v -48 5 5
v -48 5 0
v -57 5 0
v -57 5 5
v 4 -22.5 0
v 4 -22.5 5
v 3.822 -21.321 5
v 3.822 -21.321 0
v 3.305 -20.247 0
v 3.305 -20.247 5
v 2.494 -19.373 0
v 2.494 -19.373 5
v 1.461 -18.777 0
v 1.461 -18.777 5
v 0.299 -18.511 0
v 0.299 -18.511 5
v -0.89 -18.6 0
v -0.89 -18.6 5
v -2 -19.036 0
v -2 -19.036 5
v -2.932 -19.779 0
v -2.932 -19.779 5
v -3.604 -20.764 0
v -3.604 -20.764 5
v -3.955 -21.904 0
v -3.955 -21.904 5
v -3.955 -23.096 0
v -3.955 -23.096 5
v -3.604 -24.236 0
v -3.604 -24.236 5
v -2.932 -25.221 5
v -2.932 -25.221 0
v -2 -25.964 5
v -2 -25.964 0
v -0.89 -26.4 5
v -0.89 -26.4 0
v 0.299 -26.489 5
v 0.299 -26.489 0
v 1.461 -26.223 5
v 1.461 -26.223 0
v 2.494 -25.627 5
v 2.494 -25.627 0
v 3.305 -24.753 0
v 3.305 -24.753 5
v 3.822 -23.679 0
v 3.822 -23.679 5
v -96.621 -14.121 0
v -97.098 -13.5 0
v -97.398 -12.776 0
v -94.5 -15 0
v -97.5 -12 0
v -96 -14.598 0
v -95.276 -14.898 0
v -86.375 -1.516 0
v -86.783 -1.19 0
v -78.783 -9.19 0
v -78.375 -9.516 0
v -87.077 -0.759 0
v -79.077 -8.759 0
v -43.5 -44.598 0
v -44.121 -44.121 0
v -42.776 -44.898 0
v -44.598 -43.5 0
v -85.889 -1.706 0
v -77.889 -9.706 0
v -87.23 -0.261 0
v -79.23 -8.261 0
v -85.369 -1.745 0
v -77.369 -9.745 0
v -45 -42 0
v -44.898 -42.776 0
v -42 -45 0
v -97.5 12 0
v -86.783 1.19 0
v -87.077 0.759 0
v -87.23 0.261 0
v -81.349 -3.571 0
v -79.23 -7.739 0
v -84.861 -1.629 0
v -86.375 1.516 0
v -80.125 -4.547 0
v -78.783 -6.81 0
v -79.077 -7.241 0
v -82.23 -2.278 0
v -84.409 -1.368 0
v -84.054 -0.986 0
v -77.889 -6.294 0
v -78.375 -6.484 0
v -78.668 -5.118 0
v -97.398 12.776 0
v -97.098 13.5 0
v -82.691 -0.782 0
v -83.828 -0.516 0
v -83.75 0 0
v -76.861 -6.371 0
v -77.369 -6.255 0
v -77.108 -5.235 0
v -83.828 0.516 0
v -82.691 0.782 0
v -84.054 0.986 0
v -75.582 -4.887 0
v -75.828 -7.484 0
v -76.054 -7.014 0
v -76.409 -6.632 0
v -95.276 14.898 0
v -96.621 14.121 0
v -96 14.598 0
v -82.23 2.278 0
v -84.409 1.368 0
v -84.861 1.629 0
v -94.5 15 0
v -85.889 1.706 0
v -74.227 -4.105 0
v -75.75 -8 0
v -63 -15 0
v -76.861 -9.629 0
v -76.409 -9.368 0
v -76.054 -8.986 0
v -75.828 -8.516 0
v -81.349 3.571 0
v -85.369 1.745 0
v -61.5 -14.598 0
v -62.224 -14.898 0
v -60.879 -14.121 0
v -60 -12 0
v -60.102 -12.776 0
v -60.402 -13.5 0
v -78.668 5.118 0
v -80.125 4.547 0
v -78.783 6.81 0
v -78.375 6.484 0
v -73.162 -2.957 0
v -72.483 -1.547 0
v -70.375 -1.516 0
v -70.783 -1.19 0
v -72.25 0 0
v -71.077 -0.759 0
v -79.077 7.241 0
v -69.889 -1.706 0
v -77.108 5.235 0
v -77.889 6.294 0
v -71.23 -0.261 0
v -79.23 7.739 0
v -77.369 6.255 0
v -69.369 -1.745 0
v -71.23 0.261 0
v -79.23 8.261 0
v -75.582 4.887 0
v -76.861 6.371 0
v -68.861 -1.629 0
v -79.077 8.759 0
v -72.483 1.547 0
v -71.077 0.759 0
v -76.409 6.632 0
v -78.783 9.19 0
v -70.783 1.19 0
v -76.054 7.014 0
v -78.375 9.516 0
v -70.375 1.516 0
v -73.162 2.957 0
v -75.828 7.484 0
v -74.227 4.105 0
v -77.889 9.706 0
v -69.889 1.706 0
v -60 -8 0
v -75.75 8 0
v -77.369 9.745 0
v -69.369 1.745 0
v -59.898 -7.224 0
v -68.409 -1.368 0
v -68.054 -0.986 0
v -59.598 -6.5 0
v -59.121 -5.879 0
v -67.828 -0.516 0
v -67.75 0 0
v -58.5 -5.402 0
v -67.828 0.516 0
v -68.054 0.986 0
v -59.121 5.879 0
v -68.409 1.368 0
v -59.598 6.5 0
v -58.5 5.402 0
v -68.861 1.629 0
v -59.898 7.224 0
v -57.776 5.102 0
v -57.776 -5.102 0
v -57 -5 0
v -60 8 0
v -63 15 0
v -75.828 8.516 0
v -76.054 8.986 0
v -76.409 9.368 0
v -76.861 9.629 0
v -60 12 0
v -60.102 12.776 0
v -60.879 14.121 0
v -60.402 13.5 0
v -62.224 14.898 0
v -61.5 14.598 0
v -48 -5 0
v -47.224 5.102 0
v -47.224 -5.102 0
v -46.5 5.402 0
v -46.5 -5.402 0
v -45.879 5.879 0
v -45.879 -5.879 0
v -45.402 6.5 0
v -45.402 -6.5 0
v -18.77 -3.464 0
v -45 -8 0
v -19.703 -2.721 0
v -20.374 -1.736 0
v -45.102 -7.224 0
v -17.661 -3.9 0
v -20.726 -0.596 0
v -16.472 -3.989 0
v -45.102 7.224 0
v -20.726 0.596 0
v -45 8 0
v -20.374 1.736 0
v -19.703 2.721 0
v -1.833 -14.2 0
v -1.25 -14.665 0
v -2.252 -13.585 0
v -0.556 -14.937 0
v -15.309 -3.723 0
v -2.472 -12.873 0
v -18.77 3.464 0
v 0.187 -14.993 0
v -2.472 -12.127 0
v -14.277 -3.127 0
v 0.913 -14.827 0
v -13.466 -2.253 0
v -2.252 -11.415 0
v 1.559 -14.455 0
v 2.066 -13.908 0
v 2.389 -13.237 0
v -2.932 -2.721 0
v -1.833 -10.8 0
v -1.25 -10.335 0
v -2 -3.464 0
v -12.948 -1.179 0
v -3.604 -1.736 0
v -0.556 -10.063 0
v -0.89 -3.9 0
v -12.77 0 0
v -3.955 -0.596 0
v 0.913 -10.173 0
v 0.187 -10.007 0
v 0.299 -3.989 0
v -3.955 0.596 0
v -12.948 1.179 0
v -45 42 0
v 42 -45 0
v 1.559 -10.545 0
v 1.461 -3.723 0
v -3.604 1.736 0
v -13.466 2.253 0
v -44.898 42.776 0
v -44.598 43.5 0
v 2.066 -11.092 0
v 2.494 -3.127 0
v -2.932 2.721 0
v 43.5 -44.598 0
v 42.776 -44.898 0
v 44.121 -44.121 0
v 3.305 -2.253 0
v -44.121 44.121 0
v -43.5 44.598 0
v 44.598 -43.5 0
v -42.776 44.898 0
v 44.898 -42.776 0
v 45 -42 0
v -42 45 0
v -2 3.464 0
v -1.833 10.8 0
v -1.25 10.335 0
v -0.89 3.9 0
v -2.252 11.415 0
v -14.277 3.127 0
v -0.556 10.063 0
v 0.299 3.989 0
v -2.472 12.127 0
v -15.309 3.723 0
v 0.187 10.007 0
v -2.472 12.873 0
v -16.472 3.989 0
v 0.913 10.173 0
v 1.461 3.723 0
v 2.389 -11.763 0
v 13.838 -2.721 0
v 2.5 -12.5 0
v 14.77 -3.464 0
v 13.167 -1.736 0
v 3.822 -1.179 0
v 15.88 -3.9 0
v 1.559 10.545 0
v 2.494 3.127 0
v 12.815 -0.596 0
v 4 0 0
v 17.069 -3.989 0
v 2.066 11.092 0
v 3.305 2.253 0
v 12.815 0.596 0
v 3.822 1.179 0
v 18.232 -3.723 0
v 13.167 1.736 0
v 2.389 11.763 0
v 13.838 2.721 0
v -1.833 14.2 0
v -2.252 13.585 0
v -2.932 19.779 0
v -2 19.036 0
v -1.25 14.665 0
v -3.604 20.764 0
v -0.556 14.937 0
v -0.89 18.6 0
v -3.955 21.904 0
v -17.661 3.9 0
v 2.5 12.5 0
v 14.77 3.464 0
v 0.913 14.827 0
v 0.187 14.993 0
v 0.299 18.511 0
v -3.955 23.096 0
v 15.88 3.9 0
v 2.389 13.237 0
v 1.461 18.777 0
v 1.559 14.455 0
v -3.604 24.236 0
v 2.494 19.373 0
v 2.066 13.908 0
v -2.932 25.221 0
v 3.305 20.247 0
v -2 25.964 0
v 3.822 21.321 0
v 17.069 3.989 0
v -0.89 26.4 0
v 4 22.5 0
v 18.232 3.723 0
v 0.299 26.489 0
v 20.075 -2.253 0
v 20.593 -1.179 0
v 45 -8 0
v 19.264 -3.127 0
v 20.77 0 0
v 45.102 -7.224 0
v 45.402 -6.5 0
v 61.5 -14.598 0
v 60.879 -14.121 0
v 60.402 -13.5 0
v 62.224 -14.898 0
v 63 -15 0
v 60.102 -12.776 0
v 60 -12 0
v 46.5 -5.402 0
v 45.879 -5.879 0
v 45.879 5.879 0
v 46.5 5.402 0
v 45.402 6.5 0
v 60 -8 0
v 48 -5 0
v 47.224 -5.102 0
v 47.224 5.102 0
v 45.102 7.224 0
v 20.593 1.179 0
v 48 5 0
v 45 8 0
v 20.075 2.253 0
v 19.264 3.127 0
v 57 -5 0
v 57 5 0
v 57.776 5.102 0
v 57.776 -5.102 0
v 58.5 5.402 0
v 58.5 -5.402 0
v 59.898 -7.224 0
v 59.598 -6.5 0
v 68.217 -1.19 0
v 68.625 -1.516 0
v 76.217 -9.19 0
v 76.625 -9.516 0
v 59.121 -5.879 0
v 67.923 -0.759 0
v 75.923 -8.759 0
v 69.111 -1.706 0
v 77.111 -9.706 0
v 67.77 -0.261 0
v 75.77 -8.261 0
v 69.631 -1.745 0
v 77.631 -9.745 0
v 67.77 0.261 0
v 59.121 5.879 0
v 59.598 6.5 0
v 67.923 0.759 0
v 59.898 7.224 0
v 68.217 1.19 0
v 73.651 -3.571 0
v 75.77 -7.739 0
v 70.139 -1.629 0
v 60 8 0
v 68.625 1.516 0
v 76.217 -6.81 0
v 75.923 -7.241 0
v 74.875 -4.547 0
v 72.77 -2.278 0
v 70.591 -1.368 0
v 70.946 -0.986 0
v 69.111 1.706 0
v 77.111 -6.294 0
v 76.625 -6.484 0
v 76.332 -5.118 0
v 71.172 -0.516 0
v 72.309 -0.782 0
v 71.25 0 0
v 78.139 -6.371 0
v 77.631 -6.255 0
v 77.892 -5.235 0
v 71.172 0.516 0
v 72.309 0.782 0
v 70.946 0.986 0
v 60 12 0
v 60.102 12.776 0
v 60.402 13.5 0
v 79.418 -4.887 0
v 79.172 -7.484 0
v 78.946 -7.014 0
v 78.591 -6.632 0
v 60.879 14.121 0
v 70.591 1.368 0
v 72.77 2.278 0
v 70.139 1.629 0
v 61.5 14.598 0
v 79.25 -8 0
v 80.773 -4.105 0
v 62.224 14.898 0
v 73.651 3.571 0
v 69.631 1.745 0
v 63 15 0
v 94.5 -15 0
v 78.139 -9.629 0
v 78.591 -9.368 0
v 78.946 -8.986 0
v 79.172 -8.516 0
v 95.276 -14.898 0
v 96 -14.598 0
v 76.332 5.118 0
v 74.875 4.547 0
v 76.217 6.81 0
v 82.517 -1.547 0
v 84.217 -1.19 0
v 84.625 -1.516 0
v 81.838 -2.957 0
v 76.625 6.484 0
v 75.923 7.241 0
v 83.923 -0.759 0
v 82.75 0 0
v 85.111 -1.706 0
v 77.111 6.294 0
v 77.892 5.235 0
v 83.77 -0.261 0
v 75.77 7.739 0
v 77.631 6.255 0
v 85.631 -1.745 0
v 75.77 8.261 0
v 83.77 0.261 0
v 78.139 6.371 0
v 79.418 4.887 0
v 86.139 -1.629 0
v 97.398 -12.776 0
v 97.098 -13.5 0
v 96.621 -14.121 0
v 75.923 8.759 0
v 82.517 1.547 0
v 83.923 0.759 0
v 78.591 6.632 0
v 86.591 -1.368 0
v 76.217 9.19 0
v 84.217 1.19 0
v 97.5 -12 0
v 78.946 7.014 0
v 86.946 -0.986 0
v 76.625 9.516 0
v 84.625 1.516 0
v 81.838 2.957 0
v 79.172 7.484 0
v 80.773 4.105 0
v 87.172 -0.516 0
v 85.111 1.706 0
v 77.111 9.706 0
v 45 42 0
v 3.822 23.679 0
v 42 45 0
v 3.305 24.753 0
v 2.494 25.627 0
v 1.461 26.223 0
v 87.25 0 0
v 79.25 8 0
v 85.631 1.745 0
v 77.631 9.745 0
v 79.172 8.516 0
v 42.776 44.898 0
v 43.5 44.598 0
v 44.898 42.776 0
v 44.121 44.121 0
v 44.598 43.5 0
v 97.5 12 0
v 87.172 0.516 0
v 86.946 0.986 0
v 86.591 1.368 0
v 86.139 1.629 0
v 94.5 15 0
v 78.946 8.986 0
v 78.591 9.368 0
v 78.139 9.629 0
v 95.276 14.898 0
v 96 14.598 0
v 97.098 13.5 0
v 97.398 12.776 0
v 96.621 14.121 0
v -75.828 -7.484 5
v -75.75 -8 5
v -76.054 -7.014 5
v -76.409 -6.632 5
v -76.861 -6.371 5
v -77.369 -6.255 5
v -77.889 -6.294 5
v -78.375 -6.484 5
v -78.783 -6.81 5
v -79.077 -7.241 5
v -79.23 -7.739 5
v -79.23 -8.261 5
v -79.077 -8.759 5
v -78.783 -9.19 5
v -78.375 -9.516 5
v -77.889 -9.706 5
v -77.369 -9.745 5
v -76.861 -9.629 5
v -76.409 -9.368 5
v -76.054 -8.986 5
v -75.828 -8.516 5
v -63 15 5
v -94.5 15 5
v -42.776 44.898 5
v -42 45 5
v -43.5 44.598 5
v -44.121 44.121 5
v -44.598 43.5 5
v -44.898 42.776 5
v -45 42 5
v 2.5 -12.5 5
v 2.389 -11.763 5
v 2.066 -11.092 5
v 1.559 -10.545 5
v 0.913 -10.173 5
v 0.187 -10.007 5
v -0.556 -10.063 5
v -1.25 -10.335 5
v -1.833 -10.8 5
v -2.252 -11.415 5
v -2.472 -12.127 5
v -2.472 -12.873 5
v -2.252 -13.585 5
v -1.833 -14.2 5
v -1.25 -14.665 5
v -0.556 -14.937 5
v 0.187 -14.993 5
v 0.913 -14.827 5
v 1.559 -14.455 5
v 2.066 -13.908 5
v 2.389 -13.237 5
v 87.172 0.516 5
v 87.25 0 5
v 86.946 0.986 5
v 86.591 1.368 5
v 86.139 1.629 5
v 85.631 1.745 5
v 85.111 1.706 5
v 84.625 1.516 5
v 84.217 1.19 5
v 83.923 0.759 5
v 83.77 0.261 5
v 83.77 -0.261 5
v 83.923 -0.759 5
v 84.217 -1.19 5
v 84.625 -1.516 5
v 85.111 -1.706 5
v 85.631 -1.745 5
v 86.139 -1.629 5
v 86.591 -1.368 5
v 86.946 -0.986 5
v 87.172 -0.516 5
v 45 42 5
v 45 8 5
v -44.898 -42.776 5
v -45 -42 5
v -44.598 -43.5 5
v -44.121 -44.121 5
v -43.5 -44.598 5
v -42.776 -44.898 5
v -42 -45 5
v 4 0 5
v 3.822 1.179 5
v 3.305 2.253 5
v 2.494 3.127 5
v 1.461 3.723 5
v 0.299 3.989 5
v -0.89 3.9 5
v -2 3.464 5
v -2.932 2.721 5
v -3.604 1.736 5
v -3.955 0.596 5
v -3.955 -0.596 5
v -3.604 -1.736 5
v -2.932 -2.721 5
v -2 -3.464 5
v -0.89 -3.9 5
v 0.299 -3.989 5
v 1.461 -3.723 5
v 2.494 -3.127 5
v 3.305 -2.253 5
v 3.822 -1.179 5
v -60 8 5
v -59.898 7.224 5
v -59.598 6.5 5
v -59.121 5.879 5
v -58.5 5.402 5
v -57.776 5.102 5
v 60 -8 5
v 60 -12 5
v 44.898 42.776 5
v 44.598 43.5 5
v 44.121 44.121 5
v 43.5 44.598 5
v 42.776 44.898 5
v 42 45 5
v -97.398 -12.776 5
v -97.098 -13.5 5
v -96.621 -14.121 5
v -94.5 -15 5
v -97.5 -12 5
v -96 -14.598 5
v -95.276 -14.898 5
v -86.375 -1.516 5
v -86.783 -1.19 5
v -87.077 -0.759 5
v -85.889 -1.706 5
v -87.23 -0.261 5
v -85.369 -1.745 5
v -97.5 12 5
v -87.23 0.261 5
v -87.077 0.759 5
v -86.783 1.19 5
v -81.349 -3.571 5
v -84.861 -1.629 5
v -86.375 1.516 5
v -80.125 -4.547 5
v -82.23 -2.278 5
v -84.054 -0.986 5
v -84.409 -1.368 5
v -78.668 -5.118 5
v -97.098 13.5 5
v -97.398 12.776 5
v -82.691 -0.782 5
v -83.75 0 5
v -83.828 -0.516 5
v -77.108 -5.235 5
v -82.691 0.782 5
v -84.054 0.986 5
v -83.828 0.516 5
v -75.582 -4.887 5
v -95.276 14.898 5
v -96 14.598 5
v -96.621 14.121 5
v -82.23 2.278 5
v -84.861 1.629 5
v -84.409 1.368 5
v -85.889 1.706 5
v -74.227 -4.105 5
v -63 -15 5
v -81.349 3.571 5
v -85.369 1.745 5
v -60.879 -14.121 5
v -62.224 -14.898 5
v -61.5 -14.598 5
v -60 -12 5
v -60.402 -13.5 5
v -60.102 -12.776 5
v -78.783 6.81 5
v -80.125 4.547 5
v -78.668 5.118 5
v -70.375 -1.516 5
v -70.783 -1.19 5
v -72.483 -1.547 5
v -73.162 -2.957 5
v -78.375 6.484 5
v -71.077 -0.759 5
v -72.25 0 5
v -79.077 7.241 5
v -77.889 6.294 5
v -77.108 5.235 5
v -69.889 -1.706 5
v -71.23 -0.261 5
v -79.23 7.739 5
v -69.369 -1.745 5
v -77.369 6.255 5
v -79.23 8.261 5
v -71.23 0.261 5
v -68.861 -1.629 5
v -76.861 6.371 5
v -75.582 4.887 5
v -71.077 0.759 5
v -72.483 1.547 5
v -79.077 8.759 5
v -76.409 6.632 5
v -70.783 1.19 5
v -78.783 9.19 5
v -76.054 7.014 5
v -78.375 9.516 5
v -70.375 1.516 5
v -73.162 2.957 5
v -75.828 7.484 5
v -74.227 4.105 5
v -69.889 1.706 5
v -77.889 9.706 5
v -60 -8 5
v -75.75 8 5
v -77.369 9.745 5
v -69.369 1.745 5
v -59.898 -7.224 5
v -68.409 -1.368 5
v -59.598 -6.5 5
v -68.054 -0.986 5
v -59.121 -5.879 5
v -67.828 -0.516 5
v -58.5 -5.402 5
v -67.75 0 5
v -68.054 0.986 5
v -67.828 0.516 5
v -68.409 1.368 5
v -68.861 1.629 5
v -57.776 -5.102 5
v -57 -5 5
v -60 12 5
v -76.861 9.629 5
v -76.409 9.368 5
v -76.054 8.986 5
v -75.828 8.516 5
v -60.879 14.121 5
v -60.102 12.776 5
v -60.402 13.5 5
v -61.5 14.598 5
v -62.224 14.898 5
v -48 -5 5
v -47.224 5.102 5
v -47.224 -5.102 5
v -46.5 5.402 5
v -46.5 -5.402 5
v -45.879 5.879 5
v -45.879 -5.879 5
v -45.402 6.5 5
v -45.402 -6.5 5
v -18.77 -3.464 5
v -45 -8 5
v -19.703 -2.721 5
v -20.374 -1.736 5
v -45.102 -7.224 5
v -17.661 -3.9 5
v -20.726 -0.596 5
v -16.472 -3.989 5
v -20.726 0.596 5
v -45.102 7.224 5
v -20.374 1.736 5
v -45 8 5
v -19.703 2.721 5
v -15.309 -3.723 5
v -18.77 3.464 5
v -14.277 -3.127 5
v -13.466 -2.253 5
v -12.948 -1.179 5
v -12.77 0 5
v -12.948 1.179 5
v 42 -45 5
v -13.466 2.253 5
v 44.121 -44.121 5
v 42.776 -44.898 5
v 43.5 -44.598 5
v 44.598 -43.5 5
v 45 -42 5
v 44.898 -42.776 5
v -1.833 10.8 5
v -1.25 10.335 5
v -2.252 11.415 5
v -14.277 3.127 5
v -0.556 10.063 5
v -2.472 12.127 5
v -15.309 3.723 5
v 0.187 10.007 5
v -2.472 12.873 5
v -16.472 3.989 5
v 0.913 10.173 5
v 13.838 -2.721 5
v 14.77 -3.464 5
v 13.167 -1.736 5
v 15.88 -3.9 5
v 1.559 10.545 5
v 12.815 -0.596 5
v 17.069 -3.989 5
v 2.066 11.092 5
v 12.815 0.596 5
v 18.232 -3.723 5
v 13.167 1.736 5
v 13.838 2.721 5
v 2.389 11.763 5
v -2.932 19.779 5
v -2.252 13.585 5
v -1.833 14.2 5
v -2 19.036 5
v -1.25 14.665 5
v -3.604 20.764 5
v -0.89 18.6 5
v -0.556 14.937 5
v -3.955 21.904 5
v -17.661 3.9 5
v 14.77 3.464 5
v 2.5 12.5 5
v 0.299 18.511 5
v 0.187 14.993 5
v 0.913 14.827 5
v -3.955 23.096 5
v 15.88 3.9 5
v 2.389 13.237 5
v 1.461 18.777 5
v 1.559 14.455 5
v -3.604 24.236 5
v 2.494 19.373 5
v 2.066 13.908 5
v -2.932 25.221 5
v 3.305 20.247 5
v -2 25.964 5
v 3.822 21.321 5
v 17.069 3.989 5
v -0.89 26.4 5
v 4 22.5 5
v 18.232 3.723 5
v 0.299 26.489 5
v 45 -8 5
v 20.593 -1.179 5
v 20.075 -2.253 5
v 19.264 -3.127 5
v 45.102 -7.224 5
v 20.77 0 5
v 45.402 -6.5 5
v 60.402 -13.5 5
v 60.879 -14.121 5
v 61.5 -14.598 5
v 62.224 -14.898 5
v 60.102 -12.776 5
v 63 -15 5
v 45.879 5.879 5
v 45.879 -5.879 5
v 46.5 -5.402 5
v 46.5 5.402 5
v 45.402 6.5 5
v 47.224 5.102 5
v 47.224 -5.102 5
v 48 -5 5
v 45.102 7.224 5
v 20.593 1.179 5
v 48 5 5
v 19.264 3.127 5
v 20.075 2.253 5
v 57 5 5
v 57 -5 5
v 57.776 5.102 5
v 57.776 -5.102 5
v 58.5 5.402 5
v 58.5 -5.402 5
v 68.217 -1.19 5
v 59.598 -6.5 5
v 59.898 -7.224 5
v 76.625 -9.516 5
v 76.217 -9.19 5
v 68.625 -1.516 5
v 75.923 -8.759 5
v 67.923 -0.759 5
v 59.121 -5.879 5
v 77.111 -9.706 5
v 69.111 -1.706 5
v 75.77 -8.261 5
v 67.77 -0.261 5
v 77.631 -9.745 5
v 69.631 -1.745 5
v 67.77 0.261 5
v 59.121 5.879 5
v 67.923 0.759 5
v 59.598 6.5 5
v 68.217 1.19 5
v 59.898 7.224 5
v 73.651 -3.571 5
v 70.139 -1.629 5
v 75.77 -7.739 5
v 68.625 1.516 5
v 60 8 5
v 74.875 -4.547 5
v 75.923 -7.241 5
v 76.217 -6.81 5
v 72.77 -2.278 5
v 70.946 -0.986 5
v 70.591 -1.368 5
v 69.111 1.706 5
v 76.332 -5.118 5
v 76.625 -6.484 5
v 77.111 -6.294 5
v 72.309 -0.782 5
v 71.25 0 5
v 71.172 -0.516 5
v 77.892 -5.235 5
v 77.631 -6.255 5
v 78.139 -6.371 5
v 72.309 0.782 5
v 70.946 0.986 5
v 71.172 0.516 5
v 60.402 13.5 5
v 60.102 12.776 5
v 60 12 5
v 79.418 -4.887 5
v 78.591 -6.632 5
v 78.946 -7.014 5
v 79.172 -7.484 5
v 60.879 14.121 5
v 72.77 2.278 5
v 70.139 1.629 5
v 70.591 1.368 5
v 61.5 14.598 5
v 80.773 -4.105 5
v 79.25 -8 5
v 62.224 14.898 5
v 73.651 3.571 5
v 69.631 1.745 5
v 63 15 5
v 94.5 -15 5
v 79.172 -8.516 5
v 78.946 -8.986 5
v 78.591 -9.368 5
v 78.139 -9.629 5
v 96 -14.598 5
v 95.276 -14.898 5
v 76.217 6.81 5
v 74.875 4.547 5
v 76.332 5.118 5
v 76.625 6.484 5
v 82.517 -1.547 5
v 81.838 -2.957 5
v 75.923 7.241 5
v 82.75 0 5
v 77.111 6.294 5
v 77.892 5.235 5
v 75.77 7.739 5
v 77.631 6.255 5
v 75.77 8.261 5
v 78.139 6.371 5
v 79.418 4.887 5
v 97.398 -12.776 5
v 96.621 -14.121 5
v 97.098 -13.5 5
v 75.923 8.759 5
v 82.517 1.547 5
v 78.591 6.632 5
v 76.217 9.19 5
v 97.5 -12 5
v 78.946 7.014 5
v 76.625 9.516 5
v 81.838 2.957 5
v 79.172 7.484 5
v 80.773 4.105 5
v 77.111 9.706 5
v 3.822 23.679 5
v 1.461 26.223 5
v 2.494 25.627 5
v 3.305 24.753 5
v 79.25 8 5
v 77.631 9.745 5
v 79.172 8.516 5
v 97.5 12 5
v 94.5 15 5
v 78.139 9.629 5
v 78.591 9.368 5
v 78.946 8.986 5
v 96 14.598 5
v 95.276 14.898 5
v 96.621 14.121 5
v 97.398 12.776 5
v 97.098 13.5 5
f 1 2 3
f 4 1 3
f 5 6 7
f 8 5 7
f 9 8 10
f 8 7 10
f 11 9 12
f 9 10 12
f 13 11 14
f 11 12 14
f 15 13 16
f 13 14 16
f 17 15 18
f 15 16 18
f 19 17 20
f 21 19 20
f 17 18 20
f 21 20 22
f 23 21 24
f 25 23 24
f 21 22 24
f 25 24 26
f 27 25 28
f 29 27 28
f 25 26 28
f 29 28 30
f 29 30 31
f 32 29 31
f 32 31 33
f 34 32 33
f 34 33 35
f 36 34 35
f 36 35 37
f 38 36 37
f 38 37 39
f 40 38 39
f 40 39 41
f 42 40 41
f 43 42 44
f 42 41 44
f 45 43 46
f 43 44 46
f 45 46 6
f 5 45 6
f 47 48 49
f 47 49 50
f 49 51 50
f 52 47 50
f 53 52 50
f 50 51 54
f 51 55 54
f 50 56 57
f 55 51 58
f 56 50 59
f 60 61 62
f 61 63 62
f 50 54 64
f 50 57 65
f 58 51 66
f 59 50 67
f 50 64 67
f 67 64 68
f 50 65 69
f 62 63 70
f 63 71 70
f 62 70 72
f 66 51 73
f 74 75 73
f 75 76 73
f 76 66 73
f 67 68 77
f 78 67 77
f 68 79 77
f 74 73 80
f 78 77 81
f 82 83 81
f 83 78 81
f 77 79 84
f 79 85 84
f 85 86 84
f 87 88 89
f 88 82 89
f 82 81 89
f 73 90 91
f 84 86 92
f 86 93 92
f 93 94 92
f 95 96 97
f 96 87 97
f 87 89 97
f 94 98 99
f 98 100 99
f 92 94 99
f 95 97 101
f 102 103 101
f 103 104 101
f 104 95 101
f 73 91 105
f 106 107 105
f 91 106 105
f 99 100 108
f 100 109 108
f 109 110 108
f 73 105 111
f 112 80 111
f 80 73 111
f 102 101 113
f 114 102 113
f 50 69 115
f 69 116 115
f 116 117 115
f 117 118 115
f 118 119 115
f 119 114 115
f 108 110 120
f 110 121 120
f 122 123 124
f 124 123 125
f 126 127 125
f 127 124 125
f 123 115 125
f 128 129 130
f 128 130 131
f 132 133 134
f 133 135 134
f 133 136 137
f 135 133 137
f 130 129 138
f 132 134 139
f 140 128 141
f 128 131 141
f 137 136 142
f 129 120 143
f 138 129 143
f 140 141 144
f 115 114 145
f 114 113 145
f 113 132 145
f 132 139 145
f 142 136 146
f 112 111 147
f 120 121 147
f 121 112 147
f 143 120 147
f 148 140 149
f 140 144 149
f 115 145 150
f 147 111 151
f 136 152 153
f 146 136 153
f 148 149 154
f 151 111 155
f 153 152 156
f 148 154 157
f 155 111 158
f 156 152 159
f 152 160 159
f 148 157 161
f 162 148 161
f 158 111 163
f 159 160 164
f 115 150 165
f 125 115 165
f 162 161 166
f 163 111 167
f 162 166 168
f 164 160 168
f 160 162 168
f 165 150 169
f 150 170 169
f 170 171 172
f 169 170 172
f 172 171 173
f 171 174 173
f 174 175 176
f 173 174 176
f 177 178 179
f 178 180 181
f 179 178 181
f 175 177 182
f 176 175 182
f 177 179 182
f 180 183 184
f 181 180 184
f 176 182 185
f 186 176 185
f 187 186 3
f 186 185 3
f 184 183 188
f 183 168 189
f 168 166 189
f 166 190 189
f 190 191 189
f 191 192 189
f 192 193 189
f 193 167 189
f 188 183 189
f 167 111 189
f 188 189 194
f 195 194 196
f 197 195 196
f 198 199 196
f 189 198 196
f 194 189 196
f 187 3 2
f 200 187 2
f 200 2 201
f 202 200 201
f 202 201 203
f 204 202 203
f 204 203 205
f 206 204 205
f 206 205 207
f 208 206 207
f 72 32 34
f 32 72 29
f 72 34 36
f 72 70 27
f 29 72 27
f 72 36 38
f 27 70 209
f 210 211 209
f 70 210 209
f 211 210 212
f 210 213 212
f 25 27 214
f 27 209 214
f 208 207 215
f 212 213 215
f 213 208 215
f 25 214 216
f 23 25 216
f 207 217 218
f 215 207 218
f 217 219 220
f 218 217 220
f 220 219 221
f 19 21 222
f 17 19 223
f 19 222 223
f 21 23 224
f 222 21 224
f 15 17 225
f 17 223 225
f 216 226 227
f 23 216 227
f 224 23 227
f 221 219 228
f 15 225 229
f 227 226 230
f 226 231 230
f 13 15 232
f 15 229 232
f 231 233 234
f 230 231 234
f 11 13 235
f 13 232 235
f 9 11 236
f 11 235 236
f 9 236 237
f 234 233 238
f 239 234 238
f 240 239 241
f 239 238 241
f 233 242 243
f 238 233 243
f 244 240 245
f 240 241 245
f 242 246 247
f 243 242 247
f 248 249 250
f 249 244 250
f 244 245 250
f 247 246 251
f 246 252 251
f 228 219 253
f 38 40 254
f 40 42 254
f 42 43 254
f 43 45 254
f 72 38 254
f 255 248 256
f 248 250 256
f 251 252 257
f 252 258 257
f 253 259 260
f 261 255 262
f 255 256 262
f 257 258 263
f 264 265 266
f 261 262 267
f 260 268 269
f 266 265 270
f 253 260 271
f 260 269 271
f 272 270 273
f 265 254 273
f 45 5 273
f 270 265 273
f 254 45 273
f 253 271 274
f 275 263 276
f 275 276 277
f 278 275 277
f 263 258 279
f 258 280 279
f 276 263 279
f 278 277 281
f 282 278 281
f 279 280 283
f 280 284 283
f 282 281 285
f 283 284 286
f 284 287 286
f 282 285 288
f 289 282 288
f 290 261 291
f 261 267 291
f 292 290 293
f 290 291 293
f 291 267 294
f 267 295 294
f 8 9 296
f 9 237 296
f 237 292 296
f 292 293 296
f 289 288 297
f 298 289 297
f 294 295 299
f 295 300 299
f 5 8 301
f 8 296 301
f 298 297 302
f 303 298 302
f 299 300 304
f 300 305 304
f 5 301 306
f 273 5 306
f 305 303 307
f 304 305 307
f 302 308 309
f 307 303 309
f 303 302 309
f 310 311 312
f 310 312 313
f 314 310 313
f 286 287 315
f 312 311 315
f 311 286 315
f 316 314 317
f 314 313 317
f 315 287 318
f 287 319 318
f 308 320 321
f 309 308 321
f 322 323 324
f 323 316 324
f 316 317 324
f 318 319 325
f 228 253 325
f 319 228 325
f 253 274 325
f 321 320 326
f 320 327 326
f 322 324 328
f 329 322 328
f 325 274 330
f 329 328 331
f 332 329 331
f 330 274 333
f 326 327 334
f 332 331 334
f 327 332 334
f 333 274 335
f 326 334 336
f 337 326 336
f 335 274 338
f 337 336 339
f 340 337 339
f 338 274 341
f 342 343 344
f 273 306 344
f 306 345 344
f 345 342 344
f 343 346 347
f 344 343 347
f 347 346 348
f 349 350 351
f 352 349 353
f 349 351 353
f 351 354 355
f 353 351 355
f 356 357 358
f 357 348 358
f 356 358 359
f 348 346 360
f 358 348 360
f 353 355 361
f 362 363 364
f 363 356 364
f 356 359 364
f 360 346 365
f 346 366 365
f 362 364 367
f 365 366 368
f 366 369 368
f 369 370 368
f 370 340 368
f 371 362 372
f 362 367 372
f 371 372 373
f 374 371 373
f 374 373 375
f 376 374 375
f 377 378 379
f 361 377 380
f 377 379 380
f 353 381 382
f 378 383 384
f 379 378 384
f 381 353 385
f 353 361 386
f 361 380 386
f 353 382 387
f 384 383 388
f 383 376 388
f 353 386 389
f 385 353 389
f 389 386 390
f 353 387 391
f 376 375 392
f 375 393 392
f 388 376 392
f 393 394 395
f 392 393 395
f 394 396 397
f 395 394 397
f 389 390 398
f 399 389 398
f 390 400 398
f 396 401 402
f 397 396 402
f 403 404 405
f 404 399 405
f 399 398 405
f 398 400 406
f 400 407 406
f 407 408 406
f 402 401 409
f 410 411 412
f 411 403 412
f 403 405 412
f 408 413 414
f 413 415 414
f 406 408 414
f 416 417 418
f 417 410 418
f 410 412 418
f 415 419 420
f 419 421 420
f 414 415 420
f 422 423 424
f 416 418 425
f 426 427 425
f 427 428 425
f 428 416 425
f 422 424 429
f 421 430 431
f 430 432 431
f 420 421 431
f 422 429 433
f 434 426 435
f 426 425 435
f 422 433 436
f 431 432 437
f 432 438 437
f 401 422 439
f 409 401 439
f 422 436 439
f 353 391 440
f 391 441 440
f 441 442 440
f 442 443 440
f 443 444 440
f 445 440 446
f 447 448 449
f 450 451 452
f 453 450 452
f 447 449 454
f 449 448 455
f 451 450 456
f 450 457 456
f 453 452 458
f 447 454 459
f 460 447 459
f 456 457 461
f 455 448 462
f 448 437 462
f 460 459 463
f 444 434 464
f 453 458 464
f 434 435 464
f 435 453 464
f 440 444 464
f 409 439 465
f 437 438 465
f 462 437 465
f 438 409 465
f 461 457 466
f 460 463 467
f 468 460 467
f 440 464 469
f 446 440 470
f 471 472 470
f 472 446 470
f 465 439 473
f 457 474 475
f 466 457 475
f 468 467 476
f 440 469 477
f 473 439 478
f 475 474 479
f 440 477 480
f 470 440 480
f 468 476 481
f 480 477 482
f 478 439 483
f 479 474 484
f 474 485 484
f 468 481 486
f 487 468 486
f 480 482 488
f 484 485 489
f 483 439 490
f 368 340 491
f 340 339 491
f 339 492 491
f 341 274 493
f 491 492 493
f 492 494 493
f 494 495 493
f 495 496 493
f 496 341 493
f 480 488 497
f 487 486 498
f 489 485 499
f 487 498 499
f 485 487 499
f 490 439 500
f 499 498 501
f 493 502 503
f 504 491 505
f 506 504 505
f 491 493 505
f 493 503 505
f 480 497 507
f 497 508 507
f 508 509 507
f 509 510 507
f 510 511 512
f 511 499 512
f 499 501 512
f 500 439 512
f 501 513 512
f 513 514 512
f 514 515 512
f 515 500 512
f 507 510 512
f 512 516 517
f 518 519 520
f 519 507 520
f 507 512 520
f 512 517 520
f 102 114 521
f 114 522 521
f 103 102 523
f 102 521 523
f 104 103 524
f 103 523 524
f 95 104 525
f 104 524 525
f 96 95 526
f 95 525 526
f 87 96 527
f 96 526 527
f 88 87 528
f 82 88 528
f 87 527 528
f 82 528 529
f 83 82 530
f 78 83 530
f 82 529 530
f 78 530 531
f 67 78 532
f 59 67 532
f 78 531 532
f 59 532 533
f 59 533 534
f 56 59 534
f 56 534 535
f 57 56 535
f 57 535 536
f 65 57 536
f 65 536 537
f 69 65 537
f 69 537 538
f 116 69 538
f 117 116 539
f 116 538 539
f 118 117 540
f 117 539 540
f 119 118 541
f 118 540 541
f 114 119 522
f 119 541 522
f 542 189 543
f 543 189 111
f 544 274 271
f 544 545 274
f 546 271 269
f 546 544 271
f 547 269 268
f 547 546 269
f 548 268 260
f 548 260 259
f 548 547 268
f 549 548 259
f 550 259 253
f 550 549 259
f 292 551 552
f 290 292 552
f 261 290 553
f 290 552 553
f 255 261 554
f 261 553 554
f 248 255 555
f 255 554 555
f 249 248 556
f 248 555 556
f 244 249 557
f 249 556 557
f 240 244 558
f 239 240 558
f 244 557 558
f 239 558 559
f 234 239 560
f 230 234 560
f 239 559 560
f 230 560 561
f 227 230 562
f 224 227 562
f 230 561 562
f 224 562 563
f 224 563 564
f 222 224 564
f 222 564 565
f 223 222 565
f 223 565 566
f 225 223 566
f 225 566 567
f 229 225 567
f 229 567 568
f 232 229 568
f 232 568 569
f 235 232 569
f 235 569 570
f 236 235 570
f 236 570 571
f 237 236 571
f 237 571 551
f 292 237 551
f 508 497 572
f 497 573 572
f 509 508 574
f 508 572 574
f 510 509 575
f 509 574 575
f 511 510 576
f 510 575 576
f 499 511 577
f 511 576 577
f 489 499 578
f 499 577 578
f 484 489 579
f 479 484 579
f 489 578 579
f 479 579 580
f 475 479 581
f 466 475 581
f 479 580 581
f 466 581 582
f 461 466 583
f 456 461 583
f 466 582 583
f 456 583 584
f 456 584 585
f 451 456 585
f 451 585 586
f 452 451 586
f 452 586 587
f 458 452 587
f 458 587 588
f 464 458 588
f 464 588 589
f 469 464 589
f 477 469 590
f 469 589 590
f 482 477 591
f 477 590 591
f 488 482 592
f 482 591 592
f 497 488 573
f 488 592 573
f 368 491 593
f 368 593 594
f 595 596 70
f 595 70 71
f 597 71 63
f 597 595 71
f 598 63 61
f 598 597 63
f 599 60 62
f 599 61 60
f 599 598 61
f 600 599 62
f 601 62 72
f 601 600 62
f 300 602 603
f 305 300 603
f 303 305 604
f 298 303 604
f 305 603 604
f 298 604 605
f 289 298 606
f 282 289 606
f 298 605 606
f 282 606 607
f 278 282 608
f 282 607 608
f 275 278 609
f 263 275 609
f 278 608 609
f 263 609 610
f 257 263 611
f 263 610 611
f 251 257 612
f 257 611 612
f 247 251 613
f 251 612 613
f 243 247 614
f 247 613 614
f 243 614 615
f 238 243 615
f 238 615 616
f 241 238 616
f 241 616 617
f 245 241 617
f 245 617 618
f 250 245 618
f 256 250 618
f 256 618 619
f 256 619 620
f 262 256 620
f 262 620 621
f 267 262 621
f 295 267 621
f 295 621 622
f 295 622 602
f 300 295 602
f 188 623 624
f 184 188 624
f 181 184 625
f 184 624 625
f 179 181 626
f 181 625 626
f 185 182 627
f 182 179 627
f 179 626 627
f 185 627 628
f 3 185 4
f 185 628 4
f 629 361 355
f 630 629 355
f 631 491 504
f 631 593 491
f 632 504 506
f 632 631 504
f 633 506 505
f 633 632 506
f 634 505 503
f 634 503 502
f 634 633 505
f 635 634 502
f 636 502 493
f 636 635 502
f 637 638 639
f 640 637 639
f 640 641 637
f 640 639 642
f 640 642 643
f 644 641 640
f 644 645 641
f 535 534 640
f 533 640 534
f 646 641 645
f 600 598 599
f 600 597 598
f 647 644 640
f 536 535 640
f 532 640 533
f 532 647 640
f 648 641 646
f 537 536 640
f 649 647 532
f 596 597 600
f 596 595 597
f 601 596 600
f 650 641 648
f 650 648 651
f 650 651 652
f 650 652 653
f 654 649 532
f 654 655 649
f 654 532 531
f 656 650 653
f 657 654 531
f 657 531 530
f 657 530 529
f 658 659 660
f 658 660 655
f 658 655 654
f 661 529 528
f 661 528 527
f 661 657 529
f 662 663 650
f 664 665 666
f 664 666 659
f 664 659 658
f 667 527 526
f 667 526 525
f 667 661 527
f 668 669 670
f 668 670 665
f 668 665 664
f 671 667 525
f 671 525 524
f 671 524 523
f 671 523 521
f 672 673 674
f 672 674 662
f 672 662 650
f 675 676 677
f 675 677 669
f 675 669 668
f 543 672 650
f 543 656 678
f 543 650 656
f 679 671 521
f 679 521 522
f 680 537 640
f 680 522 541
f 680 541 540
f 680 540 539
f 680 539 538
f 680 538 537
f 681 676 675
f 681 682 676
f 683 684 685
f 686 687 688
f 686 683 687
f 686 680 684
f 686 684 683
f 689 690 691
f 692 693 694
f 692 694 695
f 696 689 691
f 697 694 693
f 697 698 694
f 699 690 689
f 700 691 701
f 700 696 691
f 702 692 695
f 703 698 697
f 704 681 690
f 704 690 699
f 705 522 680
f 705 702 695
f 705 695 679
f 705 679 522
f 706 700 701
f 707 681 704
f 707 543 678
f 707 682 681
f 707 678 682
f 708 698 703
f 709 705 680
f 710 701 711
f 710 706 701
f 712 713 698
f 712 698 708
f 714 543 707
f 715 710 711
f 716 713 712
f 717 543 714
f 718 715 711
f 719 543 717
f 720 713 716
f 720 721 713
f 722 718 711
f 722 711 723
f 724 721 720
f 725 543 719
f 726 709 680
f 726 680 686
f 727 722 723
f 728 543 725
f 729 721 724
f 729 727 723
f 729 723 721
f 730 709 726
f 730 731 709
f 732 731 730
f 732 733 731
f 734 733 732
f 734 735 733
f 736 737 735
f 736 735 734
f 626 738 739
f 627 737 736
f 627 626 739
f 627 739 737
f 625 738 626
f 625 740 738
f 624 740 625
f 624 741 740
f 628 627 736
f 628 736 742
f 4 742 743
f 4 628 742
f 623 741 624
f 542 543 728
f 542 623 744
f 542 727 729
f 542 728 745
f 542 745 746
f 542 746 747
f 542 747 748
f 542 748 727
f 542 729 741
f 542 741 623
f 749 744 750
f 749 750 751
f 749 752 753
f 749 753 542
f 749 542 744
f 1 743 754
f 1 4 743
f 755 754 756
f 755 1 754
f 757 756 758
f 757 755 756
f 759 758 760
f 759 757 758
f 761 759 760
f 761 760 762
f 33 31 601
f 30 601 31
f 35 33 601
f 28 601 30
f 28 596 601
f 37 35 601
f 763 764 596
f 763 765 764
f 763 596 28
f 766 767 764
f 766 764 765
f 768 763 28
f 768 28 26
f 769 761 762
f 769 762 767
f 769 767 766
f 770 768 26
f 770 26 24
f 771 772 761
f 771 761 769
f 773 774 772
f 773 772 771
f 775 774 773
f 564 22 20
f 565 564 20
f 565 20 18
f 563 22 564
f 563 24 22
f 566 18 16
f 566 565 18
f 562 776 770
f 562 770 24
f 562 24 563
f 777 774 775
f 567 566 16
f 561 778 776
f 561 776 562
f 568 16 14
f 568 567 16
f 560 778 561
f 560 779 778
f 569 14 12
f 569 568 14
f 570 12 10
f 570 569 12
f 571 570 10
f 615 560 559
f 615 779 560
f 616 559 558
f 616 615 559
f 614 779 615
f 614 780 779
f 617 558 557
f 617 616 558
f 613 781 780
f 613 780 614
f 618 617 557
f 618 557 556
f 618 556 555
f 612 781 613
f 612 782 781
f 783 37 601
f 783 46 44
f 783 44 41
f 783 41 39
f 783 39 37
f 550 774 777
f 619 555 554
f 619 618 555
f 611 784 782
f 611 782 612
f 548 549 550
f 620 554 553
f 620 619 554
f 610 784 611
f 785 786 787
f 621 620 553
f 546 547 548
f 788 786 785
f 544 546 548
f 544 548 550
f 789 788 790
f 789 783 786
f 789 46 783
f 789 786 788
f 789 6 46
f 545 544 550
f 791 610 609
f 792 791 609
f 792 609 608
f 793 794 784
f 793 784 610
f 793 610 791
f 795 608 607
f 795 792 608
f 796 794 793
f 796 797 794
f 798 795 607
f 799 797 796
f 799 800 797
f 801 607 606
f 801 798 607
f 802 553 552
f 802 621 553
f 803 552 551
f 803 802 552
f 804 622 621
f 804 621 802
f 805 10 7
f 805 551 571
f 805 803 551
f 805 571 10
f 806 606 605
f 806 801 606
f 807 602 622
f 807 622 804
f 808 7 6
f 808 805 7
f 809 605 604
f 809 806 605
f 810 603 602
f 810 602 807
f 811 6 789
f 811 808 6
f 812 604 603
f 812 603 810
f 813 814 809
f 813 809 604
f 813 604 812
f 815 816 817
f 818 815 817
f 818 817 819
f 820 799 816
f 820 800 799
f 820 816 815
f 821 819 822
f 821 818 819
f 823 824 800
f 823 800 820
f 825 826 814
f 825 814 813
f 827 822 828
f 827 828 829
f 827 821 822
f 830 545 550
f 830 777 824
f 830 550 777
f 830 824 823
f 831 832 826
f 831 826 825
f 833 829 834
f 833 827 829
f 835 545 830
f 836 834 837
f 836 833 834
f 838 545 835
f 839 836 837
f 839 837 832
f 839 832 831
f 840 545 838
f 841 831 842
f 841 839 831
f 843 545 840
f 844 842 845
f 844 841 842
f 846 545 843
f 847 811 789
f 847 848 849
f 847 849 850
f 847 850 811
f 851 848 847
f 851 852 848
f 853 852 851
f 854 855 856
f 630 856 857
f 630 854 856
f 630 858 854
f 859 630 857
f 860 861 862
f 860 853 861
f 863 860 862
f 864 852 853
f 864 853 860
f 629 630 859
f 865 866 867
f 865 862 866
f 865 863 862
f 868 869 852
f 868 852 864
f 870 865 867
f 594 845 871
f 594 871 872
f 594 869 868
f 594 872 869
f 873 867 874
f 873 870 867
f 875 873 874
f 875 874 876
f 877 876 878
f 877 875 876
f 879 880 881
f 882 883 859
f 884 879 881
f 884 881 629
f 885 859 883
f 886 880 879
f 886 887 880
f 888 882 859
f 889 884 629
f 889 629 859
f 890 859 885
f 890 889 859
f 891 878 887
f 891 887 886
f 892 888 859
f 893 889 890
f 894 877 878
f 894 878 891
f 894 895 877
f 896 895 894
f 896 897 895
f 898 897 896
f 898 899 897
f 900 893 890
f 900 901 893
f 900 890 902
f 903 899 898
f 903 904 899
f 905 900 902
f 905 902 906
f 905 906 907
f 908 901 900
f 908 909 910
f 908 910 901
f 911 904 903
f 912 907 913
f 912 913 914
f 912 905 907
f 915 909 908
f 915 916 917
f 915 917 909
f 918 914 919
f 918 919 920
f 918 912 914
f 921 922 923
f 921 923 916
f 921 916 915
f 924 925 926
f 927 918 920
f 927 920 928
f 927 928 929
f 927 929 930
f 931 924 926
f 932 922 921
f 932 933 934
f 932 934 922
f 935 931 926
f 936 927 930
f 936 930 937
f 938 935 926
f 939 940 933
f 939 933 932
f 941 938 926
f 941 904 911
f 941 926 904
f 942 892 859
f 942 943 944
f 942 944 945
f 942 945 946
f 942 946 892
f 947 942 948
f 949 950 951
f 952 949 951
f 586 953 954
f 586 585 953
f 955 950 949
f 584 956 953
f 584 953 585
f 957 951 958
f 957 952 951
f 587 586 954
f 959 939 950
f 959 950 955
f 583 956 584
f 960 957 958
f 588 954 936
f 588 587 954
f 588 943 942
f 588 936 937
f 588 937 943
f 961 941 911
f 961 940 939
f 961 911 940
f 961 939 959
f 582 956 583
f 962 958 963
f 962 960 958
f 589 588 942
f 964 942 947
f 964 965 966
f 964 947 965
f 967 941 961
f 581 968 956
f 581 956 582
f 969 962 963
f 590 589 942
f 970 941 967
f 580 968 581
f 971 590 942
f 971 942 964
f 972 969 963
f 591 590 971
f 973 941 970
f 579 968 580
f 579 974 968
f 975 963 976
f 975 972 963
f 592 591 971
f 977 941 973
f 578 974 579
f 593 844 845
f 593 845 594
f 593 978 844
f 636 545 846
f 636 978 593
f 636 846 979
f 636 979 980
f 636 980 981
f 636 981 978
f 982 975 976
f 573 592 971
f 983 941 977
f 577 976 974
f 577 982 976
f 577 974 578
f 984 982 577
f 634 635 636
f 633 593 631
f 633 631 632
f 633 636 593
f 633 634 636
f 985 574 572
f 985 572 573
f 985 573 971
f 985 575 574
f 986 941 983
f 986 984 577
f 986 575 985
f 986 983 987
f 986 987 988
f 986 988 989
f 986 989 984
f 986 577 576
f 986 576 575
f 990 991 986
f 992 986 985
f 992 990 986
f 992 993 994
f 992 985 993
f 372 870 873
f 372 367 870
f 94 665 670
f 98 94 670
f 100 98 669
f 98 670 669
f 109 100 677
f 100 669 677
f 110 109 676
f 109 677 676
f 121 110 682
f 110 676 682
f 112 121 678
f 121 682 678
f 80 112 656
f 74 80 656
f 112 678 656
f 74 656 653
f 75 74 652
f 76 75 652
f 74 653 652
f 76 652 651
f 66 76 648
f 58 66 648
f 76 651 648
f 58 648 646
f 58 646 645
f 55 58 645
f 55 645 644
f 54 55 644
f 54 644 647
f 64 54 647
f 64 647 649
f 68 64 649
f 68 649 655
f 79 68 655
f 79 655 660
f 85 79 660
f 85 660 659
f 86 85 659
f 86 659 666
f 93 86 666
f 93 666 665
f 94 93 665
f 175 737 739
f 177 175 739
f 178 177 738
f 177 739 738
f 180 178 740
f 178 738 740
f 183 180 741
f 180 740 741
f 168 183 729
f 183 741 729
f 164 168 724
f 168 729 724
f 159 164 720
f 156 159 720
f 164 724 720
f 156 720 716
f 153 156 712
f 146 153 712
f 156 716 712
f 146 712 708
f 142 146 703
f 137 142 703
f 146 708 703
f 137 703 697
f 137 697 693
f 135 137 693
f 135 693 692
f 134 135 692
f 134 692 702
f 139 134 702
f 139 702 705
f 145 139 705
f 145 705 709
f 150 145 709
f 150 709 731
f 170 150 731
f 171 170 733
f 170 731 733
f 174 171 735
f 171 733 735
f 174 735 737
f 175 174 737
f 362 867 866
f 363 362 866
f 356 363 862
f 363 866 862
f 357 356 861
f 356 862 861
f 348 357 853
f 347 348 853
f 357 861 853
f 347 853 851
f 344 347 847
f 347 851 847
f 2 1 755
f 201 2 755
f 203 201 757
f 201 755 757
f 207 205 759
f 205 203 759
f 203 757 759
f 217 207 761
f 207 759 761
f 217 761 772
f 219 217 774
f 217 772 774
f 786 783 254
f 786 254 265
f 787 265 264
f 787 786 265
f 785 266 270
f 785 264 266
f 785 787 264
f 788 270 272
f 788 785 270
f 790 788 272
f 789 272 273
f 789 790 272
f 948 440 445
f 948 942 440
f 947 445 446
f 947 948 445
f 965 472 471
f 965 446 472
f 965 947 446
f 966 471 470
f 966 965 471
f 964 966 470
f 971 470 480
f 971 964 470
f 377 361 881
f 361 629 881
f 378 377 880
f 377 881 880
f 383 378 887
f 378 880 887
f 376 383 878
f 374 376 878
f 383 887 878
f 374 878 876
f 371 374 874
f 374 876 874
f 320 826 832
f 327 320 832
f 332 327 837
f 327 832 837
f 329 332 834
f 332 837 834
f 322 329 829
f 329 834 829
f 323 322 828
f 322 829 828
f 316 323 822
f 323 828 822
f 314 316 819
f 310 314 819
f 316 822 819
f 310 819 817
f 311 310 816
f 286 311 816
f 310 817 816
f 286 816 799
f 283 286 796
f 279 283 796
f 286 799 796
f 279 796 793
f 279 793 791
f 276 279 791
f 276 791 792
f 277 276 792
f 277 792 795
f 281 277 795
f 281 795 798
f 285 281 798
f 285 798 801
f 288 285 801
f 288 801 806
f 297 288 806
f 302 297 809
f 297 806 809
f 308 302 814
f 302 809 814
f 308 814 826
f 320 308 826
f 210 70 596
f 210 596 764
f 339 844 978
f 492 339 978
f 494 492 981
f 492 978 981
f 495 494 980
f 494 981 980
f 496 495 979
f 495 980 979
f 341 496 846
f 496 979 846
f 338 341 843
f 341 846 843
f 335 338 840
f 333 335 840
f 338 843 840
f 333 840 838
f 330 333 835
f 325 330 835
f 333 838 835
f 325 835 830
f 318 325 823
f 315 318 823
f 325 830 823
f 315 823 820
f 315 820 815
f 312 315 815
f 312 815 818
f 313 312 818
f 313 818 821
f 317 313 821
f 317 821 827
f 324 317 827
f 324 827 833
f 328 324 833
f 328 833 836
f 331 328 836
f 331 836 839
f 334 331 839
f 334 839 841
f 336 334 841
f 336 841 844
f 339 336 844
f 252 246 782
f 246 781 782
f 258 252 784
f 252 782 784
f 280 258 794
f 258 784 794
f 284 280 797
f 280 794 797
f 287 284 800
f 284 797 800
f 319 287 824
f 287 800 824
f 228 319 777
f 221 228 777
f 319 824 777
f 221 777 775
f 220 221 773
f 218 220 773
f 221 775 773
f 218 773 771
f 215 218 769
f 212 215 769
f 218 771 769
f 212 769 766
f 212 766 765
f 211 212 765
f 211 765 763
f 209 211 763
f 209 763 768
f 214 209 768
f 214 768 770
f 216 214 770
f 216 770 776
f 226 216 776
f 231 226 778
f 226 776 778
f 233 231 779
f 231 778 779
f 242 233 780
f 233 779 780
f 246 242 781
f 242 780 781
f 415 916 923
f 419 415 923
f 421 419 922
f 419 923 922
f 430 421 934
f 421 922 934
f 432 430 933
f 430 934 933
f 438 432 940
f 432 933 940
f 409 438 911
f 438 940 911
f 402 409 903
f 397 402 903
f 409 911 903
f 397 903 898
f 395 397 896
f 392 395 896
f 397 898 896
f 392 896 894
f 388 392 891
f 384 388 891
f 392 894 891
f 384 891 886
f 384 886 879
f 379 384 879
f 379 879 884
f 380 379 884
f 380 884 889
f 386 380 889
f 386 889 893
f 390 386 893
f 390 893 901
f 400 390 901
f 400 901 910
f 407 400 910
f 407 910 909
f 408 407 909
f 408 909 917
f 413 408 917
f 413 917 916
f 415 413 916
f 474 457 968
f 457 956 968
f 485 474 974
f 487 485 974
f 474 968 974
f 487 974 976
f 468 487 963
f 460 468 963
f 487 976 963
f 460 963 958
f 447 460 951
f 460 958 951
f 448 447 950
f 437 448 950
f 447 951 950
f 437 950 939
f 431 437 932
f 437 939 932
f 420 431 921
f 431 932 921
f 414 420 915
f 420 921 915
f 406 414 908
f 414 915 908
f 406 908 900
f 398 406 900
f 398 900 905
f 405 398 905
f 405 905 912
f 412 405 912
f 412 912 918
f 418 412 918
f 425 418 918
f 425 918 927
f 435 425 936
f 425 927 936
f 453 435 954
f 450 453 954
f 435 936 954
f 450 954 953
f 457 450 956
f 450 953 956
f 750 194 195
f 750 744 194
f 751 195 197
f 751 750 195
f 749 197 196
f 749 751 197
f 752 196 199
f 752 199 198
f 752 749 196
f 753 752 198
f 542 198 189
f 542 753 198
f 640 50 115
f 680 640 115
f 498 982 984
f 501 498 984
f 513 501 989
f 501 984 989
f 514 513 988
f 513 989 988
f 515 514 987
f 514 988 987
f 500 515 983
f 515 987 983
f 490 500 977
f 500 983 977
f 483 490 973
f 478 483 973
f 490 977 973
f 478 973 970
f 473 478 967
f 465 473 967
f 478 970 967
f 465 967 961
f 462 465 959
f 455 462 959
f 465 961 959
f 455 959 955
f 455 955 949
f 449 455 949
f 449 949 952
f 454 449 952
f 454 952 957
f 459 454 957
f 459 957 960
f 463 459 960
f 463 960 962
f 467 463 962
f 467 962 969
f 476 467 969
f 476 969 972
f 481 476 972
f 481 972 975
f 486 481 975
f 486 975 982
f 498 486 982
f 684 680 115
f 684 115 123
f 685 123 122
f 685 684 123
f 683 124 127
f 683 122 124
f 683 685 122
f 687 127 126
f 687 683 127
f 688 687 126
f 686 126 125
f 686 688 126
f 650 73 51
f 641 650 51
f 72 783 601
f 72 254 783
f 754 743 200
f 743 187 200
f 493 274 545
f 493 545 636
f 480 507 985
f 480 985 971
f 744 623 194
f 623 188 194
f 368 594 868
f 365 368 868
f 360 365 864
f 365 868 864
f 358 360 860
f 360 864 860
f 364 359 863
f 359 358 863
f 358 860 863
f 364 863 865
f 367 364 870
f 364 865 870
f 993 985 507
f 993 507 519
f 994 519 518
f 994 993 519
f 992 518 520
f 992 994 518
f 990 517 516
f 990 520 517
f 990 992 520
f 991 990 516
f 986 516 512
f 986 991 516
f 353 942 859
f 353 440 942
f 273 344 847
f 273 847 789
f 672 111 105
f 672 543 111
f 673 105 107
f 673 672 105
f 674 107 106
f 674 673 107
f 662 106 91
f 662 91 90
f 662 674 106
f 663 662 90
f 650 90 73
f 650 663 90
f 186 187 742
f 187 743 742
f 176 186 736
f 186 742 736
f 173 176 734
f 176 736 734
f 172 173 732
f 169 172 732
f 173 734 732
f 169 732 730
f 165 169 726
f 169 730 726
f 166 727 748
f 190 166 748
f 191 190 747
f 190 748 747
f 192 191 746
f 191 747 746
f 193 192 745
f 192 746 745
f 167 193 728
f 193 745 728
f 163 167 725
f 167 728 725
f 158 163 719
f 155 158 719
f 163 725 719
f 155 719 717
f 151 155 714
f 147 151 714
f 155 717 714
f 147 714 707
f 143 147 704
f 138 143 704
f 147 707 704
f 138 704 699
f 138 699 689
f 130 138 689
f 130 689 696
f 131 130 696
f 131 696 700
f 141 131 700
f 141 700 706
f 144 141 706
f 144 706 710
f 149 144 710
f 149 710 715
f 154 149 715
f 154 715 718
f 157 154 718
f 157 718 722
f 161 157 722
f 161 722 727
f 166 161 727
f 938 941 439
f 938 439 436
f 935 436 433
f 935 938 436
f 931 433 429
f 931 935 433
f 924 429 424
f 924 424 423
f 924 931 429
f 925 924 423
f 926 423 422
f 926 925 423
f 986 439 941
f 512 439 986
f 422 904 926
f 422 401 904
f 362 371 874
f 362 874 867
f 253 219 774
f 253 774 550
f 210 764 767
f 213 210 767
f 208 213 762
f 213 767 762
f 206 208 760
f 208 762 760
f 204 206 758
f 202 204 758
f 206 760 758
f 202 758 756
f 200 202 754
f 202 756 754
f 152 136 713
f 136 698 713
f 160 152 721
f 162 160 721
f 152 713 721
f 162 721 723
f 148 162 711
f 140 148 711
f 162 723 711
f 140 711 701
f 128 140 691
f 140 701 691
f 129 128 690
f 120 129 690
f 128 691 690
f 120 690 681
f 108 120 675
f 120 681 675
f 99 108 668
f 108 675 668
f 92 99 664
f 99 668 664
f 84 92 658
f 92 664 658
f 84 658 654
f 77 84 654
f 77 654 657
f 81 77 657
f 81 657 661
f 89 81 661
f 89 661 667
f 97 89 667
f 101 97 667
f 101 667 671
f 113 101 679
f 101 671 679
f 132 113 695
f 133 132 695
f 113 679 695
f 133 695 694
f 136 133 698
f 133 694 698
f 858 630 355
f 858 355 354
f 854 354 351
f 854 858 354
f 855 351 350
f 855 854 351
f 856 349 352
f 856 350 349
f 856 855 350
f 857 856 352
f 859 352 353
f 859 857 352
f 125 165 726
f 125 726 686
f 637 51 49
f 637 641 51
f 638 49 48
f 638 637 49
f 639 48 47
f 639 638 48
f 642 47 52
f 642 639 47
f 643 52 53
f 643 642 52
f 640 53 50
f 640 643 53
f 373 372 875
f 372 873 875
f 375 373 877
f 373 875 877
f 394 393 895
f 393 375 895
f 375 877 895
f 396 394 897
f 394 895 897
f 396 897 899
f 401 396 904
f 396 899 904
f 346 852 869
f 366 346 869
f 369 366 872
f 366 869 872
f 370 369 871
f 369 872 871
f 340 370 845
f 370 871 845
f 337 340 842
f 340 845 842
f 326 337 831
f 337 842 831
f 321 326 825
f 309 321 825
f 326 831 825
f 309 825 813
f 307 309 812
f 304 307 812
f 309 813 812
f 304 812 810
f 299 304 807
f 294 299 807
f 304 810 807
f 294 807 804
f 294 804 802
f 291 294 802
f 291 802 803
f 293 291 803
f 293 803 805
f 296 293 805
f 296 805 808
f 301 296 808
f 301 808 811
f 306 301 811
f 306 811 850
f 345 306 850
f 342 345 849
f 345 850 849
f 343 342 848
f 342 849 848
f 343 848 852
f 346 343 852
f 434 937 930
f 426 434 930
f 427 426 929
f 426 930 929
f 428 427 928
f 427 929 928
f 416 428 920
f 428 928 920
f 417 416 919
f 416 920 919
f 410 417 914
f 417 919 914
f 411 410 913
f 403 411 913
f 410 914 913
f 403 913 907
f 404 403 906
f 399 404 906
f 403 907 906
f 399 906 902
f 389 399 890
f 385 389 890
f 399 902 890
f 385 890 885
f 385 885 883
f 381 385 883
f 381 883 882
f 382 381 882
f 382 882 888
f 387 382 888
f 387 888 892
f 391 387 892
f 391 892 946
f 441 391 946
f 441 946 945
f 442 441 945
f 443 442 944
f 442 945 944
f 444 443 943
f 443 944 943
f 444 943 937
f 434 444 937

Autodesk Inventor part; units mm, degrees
ref_plane "YZ Plane" through (0, 0, 0) normal (1, 0, 0) x (0, 1, 0)
ref_plane "XZ Plane" through (0, 0, 0) normal (0, 1, 0) x (-1, 0, 0)
ref_plane "XY Plane" through (0, 0, 0) normal (0, 0, 1) x (1, 0, 0)
sketch "Sketch1" plane through (0, 0, 0) normal (0, 0, 1) x (1, 0, 0)
  line L0 (0, 0) -> (0, 20) construction
  line L1 (2.5, 15) -> (97.5, 15)
  line L2 (97.5, 15) -> (97.5, -15)
  line L3 (97.5, -15) -> (2.5, -15)
  line L4 (2.5, -15) -> (2.5, 15)
  line L5 (2.5, 15) -> (97.5, -15) construction
  line L6 (97.5, 15) -> (2.5, -15) construction
  line L7 (40, 5) -> (60, 5)
  line L8 (60, 5) -> (60, -5)
  line L9 (60, -5) -> (40, -5)
  line L10 (40, -5) -> (40, 5)
  line L11 (40, 5) -> (60, -5) construction
  line L12 (60, 5) -> (40, -5) construction
  line L13 (60, 5) -> (60, 15)
  line L14 (60, -5) -> (60, -15)
  line L15 (-2.5, 15) -> (-97.5, 15)
  line L16 (-97.5, 15) -> (-97.5, -15)
  line L17 (-97.5, -15) -> (-2.5, -15)
  line L18 (-2.5, -15) -> (-2.5, 15)
  line L19 (-2.5, 15) -> (-97.5, -15) construction
  line L20 (-97.5, 15) -> (-2.5, -15) construction
  line L21 (-40, 5) -> (-60, 5)
  line L22 (-60, 5) -> (-60, -5)
  line L23 (-60, -5) -> (-40, -5)
  line L24 (-40, -5) -> (-40, 5)
  line L25 (-40, 5) -> (-60, -5) construction
  line L26 (-60, 5) -> (-40, -5) construction
  line L27 (-60, 5) -> (-60, 15)
  line L28 (-60, -5) -> (-60, -15)
  line L29 (-45, 45) -> (45, 45)
  line L30 (45, 45) -> (45, -45)
  line L31 (45, -45) -> (-45, -45)
  line L32 (-45, -45) -> (-45, 45)
  line L33 (-45, 45) -> (45, -45) construction
  line L34 (45, 45) -> (-45, -45) construction
  point P0 (50, 0)
  point P1 (50, 0)
  point P2 (-50, 0)
  point P3 (-50, 0)
  point P4 (45, 15)
  point P5 (-45, 15)
  point P6 (-45, -15)
  point P7 (45, -15)
  point P8 (45, -5)
  point P9 (45, 5)
  point P10 (-45, -5)
  point P11 (-45, 5)
  dimension "d3" = 20
  dimension "d17" = 95
  dimension "d18" = 30
  dimension "d19" = 20
  dimension "d20" = 10
  dimension "d70" = 90
  dimension "d71" = 90
  dimension "d72" = 50
extrude "Extrusion1" add sketch "Sketch1" along normal blind 5 contours L1 L2 L3 L14 L8 L13 | L30 L7 L10 L9 L3 L4 L1 | L1 L4 L3 L30 L31 L32 L17 L18 L15 L29 | L8 L9 L30 L7 | L30 L9 L10 L7 | L15 L18 L17 L32 L23 L24 L21 | L27 L22 L28 L17 L16 L15 | L32 L23 L22 L21 | L21 L24 L23 L32
sketch "Sketch2" plane through (0, 0, 5) normal (0, 0, 1) x (1, 0, 0)
  line L0 (0, 0) -> (-77.5, 0) construction
  circle A0 centre (-77.5, 0) radius 5.25
  line L1 (0, 0) -> (0, 20) construction
  circle A1 centre (-77.5, 0) radius 8
  circle A2 centre (-69.5, 0) radius 1.75
  circle A3 centre (-77.5, 8) radius 1.75
  circle A4 centre (-85.5, 0) radius 1.75
  circle A5 centre (-77.5, -8) radius 1.75
  circle A6 centre (77.5, 0) radius 5.25
  circle A7 centre (77.5, 0) radius 8
  circle A8 centre (69.5, 0) radius 1.75
  circle A9 centre (77.5, 8) radius 1.75
  circle A10 centre (85.5, 0) radius 1.75
  circle A11 centre (77.5, -8) radius 1.75
  dimension "d26" = 16
  dimension "d6" = 77.5
  dimension "d7" = 10.5
  dimension "d8" = 20
  dimension "d27" = 3.5
  dimension "d30" = 360
extrude "Extrusion2" cut sketch "Sketch2" against normal blind 7 contours A0 | A1 A2 | A1 A2 | A3 A1 | A1 A3 | A5 A1 | A1 A5 | A4 A1 | A1 A4 | A6 | A7 A10 | A7 A10 | A9 A7 | A7 A9 | A11 A7 | A7 A11 | A8 A7 | A7 A8
fillet "Fillet1" radius 3 20 edges at (-60, 5, 2.5) (-60, 15, 2.5) (-60, -5, 2.5) (-60, -15, 2.5) (-97.5, -15, 2.5) (-97.5, 15, 2.5) (97.5, 15, 2.5) (97.5, -15, 2.5) (60, -15, 2.5) (60, 15, 2.5) (60, -5, 2.5) (60, 5, 2.5) (-45, 5, 2.5) (-45, -5, 2.5) (45, 5, 2.5) (45, -5, 2.5) (-45, 45, 2.5) (45, 45, 2.5) (45, -45, 2.5) (-45, -45, 2.5)
sketch "Sketch4" plane through (0, 0, 5) normal (0, 0, 1) x (1, 0, 0)
  line L0 (-17.5, 5) -> (17.5, 5)
  line L1 (17.5, 5) -> (17.5, -5)
  line L2 (17.5, -5) -> (-17.5, -5)
  line L3 (-17.5, -5) -> (-17.5, 5)
  line L4 (-17.5, 5) -> (17.5, -5) construction
  line L5 (17.5, 5) -> (-17.5, -5) construction
  circle A0 centre (0, -5) radius 17.5
  circle A1 centre (0, 5) radius 17.5
  circle A2 centre (0, -22.5) radius 4
  circle A3 centre (0, 22.5) radius 4
  circle A4 centre (0, 0) radius 4
  circle A5 centre (16.7705, 0) radius 4
  circle A6 centre (-16.7705, 0) radius 4
  circle A7 centre (0, -12.5) radius 2.5
  circle A8 centre (0, 12.5) radius 2.5
  dimension "d32" = 35
  dimension "d33" = 10
  dimension "d34" = 35
  dimension "d35" = 35
  dimension "d36" = 8
  dimension "d37" = 8
  dimension "d38" = 8
  dimension "d39" = 8
  dimension "d40" = 8
  dimension "d41" = 5
  dimension "d42" = 5
extrude "Extrusion3" cut sketch "Sketch4" against normal blind 10 contours A6 A1 A0 L3 | L3 A6 | A3 A1 | A1 A3 | A6 A0 A1 | A8 A0 | A0 A8 | A6 A1 A0 | A1 A6 A0 | A5 A1 A0 | A0 A1 A5 | A5 L1 | L1 A5 A0 A1 | A0 A5 A1 | A2 A0 | A0 A2 | A7 A1 | A1 A7 | A4
properties part number "TAPA CUADRADA QUE DESPLAZA CON TORNILLOS"
